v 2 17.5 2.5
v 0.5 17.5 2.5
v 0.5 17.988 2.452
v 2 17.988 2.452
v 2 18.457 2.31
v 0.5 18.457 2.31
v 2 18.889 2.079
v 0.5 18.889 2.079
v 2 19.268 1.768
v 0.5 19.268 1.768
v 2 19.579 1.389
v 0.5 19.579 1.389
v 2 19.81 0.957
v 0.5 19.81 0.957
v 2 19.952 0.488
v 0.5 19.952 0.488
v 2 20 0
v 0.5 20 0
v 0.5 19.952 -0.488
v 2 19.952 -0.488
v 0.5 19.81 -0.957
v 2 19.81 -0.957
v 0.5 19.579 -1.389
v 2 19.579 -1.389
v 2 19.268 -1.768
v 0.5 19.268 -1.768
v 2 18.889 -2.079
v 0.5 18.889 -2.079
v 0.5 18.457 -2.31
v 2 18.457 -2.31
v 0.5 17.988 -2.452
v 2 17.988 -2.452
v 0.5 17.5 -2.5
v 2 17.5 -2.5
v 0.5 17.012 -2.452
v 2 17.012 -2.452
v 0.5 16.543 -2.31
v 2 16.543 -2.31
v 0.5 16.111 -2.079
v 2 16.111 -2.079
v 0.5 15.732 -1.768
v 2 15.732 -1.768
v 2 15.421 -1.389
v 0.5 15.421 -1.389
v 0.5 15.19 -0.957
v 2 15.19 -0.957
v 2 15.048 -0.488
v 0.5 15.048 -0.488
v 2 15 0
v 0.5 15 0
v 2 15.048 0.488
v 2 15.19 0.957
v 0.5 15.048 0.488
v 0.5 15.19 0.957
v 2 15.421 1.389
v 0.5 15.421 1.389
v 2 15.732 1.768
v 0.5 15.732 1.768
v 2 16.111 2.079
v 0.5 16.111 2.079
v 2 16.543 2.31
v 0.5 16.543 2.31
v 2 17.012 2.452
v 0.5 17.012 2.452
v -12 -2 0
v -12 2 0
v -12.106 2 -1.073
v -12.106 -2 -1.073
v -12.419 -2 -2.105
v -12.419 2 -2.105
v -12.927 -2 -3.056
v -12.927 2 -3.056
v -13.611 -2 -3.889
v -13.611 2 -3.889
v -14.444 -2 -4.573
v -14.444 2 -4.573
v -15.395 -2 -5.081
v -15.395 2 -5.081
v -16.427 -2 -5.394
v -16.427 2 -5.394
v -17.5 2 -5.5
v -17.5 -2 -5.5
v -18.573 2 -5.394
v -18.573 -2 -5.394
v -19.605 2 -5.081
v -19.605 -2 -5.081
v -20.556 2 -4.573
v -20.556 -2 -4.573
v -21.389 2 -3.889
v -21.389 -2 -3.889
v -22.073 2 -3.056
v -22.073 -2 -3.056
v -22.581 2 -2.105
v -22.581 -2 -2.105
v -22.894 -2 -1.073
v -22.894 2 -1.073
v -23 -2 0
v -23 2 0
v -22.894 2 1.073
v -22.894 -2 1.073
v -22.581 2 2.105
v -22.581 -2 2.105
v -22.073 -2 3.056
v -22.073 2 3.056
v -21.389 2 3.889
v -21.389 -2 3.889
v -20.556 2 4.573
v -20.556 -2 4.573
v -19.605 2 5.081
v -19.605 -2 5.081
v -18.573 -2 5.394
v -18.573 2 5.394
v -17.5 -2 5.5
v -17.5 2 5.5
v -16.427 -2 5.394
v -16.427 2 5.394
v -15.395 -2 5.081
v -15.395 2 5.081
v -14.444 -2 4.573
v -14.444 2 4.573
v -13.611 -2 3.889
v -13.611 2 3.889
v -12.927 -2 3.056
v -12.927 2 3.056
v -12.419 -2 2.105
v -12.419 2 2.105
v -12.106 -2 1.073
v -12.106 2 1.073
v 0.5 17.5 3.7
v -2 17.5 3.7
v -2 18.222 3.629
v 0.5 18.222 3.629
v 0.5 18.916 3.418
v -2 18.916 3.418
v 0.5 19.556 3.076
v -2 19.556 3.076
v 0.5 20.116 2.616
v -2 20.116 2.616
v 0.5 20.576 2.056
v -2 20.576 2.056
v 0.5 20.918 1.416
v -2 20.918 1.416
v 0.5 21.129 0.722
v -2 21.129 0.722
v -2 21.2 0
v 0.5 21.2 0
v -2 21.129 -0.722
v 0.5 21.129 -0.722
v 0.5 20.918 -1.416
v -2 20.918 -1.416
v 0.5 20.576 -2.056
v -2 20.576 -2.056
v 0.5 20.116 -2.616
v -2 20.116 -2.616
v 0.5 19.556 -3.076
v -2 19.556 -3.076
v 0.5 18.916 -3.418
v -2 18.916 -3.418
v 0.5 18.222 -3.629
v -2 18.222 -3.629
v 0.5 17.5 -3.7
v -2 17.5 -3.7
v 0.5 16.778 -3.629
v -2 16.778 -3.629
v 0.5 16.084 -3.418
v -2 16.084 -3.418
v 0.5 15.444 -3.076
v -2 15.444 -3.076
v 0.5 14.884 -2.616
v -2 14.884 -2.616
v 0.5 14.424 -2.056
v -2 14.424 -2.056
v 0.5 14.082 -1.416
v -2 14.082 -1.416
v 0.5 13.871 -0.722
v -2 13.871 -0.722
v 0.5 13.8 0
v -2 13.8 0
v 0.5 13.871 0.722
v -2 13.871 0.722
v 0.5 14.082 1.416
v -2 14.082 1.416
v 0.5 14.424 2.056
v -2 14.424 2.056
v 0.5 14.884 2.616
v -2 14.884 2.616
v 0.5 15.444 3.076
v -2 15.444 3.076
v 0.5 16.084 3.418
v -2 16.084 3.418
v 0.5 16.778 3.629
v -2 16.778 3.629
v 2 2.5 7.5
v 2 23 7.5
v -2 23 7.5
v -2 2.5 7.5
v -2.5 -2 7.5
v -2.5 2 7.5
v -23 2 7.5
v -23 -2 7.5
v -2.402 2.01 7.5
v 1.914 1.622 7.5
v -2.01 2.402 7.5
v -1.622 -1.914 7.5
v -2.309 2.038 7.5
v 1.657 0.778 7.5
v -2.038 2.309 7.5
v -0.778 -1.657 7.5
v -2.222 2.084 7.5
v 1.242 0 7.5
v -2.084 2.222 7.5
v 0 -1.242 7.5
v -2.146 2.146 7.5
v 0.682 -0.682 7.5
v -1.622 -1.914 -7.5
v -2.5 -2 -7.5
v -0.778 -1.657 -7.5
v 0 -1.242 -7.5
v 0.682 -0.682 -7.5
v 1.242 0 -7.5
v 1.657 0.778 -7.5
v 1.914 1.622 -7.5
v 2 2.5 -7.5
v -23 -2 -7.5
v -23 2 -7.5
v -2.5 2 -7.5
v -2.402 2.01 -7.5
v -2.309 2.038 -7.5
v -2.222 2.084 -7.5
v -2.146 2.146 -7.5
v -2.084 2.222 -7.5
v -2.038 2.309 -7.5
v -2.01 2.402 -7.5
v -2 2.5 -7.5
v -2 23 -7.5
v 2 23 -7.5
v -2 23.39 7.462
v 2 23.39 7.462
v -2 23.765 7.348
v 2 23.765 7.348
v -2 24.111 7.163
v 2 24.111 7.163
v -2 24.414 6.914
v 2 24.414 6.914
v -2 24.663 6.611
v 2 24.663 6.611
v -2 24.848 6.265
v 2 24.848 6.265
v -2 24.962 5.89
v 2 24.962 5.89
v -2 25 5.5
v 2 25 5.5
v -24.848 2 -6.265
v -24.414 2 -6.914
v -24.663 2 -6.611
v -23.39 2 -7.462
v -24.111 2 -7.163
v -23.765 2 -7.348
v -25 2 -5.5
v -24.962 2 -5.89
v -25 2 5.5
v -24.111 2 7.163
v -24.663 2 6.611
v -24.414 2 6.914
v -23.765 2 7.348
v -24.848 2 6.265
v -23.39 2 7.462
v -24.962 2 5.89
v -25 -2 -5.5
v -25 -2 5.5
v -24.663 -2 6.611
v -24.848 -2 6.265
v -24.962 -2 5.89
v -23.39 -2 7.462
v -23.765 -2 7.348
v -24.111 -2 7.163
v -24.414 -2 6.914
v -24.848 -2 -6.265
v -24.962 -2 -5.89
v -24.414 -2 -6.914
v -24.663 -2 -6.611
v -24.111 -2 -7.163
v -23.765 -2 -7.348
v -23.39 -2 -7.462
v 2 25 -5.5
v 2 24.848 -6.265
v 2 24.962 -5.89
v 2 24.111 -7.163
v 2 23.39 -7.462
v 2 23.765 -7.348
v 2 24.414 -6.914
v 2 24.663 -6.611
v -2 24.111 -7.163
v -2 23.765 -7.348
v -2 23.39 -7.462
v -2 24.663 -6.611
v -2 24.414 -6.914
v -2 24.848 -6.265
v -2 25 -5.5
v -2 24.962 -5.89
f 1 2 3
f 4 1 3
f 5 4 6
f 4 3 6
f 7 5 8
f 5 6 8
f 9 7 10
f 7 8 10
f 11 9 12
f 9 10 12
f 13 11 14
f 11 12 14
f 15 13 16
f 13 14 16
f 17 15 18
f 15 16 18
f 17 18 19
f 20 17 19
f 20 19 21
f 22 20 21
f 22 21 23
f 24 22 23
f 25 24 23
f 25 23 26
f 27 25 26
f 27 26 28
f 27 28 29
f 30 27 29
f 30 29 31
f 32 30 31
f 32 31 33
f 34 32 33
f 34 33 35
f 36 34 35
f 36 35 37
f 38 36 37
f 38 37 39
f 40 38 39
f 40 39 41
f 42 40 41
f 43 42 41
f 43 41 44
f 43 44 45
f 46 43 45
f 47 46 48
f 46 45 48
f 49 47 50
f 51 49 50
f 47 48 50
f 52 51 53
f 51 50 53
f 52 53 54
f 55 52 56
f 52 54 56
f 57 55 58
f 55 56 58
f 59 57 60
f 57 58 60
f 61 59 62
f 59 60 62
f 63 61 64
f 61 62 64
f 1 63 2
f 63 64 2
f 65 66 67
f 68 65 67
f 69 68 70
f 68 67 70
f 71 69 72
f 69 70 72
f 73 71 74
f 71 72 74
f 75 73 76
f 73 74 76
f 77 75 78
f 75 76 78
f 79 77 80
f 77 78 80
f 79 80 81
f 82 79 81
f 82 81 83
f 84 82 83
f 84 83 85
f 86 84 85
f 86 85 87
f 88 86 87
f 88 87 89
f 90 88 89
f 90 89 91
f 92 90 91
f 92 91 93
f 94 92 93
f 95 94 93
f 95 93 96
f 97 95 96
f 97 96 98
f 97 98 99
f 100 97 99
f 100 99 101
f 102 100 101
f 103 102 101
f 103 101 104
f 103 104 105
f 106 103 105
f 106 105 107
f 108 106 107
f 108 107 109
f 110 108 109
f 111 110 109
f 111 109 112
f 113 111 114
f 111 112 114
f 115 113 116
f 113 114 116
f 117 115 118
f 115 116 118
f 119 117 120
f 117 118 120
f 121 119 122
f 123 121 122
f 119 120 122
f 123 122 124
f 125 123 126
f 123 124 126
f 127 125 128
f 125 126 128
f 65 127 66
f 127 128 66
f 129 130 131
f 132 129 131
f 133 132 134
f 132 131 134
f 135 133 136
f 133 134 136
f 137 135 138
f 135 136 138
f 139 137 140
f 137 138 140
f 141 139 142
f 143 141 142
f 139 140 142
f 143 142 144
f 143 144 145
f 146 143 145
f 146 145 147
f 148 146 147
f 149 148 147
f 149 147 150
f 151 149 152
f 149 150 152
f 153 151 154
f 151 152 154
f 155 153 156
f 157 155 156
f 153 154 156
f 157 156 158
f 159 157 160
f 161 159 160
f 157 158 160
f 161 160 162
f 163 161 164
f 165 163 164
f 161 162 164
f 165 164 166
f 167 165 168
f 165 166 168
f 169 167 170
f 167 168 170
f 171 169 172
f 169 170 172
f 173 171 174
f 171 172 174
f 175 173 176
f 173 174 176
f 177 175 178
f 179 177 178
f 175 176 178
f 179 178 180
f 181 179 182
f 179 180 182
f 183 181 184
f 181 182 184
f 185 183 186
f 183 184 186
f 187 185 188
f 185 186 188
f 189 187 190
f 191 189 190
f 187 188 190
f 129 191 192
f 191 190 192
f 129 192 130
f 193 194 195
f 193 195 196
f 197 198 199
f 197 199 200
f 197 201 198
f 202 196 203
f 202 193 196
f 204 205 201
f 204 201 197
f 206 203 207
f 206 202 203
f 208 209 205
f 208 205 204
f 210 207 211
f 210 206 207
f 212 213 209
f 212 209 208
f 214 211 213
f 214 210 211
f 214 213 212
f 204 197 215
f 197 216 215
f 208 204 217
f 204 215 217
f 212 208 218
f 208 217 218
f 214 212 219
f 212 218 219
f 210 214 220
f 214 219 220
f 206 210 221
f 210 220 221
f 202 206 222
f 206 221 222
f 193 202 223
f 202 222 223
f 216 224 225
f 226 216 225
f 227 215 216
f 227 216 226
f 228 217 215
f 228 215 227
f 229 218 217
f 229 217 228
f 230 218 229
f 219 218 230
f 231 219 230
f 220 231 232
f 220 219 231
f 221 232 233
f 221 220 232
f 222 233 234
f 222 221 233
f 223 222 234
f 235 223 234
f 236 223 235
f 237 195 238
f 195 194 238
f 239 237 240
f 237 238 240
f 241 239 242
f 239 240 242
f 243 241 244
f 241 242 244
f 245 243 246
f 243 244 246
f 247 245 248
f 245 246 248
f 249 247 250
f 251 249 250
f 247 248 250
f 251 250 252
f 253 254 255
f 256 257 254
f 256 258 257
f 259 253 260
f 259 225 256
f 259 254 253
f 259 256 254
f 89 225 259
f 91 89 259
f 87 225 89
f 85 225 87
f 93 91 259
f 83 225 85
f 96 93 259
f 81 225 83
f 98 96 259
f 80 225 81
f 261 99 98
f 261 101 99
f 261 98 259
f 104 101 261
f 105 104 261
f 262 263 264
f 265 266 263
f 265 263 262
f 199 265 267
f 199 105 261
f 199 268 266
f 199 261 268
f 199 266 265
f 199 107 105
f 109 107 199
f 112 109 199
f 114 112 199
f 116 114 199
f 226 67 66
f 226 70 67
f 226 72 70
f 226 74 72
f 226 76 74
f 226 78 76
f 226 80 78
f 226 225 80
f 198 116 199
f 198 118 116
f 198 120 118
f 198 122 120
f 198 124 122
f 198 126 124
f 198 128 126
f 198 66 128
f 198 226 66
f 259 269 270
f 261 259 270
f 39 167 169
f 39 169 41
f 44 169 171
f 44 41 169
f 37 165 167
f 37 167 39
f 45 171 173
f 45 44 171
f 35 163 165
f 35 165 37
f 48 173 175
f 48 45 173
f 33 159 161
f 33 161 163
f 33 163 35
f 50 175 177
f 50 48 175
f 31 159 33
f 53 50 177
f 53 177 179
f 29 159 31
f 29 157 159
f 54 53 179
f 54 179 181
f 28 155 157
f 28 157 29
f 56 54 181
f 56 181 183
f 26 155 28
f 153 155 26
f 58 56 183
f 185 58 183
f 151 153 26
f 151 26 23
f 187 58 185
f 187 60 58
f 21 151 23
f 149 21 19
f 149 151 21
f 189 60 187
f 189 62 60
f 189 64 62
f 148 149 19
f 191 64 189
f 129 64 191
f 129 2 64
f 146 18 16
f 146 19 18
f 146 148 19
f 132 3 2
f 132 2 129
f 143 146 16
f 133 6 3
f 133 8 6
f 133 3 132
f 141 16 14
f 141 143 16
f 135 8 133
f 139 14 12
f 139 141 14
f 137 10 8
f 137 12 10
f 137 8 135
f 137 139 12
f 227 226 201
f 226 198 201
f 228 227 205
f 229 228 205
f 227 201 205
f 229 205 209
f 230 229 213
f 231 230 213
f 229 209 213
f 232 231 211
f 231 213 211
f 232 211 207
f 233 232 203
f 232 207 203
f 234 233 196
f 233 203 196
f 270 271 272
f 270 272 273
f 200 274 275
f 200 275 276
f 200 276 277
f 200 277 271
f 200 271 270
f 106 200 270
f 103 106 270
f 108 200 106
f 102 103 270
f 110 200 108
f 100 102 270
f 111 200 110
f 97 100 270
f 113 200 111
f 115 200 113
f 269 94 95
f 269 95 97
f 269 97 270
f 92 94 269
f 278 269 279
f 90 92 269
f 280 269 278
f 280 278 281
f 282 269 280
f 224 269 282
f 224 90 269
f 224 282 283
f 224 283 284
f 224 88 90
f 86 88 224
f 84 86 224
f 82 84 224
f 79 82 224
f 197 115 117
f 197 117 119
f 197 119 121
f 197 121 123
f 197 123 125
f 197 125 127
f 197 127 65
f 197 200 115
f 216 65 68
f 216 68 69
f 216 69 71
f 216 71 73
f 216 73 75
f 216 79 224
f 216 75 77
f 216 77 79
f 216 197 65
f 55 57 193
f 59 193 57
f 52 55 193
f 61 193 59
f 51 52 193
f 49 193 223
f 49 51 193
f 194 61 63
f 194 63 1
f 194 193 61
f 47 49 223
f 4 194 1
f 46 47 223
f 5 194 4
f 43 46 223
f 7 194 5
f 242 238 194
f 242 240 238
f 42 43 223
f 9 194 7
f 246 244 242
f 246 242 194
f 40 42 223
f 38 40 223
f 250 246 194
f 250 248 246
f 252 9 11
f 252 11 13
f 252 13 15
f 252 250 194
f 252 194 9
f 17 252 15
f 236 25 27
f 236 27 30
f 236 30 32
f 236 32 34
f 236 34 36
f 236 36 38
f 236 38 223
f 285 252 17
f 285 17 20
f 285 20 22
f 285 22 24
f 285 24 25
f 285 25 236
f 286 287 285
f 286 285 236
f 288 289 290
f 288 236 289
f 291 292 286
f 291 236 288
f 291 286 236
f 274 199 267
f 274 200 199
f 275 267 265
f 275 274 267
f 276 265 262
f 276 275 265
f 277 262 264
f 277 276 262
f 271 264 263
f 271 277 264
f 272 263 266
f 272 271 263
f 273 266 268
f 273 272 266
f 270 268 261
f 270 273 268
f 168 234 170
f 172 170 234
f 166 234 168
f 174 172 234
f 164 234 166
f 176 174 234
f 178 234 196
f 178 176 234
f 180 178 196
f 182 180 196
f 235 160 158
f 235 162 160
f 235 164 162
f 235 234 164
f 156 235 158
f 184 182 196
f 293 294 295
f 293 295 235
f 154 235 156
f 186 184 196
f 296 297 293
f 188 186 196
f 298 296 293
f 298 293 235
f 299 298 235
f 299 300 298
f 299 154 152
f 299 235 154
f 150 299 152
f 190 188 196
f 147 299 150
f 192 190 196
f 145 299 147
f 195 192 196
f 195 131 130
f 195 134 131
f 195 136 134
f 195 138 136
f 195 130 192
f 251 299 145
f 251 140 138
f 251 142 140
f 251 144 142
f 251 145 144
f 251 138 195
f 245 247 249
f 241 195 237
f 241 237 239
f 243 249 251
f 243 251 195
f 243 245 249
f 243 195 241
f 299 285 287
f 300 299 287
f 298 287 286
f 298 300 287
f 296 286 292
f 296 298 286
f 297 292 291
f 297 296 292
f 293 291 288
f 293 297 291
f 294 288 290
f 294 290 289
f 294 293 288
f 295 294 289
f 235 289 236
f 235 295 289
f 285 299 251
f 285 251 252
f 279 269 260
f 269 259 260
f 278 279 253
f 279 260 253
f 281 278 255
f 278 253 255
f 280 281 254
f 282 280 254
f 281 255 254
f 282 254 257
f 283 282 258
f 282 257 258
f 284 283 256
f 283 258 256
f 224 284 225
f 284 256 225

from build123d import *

# Parameters (mm, degrees)
SKETCH5_W          = 15
SKETCH5_H          = 4
SKETCH6_R          = 5.5
CUT_EXTRUDE1_DEPTH = 5
SKETCH7_R          = 2.5
CUT_EXTRUDE2_DEPTH = 5
FILLET1_R          = 2
SKETCH9_R          = 3.7
CUT_EXTRUDE3_DEPTH = 2.5


with BuildPart() as part:
    # Sweep1: sweep along a path in Sketch2
    with BuildLine(Plane.XY) as sweep1_path:
        Line((-25, 0), (-2.5, 0))
        ThreePointArc((-2.5, 0), (-0.732233047, 0.732233047), (0, 2.5))
        Line((0, 2.5), (0, 25))
    # Sketch5 → Sweep1 (sweep)
    with BuildSketch(Plane(origin=(-25, 0, 0), x_dir=(0, 0, -1), z_dir=(1, 0, 0))):
        Rectangle(SKETCH5_W, SKETCH5_H)
    sweep(path=sweep1_path.line)

    # Sketch6 → Cut-Extrude1 (cut, through all)
    with BuildSketch(Plane(origin=(0, 2, 0), x_dir=(1, 0, 0), z_dir=(0, 1, 0))):
        with Locations((-17.5, 0)):
            Circle(SKETCH6_R)
    extrude(amount=-CUT_EXTRUDE1_DEPTH, mode=Mode.SUBTRACT)

    # Sketch7 → Cut-Extrude2 (cut, through all)
    with BuildSketch(Plane.ZY.offset(2)):
        with Locations((0, 17.5)):
            Circle(SKETCH7_R)
    extrude(amount=-CUT_EXTRUDE2_DEPTH, mode=Mode.SUBTRACT)

    # Fillet1
    fillet1_edges = [part.edges().sort_by_distance(p)[0] for p in [
        (-25, 0, 7.5),
        (0, 25, -7.5),
        (0, 25, 7.5),
        (-25, 0, -7.5),
    ]]
    fillet(fillet1_edges, radius=FILLET1_R)

    # Sketch9 → Cut-Extrude3 (cut)
    with BuildSketch(Plane.ZY.offset(2)):
        with Locations((0, 17.5)):
            Circle(SKETCH9_R)
    extrude(amount=-CUT_EXTRUDE3_DEPTH, mode=Mode.SUBTRACT)


solid = part.part
